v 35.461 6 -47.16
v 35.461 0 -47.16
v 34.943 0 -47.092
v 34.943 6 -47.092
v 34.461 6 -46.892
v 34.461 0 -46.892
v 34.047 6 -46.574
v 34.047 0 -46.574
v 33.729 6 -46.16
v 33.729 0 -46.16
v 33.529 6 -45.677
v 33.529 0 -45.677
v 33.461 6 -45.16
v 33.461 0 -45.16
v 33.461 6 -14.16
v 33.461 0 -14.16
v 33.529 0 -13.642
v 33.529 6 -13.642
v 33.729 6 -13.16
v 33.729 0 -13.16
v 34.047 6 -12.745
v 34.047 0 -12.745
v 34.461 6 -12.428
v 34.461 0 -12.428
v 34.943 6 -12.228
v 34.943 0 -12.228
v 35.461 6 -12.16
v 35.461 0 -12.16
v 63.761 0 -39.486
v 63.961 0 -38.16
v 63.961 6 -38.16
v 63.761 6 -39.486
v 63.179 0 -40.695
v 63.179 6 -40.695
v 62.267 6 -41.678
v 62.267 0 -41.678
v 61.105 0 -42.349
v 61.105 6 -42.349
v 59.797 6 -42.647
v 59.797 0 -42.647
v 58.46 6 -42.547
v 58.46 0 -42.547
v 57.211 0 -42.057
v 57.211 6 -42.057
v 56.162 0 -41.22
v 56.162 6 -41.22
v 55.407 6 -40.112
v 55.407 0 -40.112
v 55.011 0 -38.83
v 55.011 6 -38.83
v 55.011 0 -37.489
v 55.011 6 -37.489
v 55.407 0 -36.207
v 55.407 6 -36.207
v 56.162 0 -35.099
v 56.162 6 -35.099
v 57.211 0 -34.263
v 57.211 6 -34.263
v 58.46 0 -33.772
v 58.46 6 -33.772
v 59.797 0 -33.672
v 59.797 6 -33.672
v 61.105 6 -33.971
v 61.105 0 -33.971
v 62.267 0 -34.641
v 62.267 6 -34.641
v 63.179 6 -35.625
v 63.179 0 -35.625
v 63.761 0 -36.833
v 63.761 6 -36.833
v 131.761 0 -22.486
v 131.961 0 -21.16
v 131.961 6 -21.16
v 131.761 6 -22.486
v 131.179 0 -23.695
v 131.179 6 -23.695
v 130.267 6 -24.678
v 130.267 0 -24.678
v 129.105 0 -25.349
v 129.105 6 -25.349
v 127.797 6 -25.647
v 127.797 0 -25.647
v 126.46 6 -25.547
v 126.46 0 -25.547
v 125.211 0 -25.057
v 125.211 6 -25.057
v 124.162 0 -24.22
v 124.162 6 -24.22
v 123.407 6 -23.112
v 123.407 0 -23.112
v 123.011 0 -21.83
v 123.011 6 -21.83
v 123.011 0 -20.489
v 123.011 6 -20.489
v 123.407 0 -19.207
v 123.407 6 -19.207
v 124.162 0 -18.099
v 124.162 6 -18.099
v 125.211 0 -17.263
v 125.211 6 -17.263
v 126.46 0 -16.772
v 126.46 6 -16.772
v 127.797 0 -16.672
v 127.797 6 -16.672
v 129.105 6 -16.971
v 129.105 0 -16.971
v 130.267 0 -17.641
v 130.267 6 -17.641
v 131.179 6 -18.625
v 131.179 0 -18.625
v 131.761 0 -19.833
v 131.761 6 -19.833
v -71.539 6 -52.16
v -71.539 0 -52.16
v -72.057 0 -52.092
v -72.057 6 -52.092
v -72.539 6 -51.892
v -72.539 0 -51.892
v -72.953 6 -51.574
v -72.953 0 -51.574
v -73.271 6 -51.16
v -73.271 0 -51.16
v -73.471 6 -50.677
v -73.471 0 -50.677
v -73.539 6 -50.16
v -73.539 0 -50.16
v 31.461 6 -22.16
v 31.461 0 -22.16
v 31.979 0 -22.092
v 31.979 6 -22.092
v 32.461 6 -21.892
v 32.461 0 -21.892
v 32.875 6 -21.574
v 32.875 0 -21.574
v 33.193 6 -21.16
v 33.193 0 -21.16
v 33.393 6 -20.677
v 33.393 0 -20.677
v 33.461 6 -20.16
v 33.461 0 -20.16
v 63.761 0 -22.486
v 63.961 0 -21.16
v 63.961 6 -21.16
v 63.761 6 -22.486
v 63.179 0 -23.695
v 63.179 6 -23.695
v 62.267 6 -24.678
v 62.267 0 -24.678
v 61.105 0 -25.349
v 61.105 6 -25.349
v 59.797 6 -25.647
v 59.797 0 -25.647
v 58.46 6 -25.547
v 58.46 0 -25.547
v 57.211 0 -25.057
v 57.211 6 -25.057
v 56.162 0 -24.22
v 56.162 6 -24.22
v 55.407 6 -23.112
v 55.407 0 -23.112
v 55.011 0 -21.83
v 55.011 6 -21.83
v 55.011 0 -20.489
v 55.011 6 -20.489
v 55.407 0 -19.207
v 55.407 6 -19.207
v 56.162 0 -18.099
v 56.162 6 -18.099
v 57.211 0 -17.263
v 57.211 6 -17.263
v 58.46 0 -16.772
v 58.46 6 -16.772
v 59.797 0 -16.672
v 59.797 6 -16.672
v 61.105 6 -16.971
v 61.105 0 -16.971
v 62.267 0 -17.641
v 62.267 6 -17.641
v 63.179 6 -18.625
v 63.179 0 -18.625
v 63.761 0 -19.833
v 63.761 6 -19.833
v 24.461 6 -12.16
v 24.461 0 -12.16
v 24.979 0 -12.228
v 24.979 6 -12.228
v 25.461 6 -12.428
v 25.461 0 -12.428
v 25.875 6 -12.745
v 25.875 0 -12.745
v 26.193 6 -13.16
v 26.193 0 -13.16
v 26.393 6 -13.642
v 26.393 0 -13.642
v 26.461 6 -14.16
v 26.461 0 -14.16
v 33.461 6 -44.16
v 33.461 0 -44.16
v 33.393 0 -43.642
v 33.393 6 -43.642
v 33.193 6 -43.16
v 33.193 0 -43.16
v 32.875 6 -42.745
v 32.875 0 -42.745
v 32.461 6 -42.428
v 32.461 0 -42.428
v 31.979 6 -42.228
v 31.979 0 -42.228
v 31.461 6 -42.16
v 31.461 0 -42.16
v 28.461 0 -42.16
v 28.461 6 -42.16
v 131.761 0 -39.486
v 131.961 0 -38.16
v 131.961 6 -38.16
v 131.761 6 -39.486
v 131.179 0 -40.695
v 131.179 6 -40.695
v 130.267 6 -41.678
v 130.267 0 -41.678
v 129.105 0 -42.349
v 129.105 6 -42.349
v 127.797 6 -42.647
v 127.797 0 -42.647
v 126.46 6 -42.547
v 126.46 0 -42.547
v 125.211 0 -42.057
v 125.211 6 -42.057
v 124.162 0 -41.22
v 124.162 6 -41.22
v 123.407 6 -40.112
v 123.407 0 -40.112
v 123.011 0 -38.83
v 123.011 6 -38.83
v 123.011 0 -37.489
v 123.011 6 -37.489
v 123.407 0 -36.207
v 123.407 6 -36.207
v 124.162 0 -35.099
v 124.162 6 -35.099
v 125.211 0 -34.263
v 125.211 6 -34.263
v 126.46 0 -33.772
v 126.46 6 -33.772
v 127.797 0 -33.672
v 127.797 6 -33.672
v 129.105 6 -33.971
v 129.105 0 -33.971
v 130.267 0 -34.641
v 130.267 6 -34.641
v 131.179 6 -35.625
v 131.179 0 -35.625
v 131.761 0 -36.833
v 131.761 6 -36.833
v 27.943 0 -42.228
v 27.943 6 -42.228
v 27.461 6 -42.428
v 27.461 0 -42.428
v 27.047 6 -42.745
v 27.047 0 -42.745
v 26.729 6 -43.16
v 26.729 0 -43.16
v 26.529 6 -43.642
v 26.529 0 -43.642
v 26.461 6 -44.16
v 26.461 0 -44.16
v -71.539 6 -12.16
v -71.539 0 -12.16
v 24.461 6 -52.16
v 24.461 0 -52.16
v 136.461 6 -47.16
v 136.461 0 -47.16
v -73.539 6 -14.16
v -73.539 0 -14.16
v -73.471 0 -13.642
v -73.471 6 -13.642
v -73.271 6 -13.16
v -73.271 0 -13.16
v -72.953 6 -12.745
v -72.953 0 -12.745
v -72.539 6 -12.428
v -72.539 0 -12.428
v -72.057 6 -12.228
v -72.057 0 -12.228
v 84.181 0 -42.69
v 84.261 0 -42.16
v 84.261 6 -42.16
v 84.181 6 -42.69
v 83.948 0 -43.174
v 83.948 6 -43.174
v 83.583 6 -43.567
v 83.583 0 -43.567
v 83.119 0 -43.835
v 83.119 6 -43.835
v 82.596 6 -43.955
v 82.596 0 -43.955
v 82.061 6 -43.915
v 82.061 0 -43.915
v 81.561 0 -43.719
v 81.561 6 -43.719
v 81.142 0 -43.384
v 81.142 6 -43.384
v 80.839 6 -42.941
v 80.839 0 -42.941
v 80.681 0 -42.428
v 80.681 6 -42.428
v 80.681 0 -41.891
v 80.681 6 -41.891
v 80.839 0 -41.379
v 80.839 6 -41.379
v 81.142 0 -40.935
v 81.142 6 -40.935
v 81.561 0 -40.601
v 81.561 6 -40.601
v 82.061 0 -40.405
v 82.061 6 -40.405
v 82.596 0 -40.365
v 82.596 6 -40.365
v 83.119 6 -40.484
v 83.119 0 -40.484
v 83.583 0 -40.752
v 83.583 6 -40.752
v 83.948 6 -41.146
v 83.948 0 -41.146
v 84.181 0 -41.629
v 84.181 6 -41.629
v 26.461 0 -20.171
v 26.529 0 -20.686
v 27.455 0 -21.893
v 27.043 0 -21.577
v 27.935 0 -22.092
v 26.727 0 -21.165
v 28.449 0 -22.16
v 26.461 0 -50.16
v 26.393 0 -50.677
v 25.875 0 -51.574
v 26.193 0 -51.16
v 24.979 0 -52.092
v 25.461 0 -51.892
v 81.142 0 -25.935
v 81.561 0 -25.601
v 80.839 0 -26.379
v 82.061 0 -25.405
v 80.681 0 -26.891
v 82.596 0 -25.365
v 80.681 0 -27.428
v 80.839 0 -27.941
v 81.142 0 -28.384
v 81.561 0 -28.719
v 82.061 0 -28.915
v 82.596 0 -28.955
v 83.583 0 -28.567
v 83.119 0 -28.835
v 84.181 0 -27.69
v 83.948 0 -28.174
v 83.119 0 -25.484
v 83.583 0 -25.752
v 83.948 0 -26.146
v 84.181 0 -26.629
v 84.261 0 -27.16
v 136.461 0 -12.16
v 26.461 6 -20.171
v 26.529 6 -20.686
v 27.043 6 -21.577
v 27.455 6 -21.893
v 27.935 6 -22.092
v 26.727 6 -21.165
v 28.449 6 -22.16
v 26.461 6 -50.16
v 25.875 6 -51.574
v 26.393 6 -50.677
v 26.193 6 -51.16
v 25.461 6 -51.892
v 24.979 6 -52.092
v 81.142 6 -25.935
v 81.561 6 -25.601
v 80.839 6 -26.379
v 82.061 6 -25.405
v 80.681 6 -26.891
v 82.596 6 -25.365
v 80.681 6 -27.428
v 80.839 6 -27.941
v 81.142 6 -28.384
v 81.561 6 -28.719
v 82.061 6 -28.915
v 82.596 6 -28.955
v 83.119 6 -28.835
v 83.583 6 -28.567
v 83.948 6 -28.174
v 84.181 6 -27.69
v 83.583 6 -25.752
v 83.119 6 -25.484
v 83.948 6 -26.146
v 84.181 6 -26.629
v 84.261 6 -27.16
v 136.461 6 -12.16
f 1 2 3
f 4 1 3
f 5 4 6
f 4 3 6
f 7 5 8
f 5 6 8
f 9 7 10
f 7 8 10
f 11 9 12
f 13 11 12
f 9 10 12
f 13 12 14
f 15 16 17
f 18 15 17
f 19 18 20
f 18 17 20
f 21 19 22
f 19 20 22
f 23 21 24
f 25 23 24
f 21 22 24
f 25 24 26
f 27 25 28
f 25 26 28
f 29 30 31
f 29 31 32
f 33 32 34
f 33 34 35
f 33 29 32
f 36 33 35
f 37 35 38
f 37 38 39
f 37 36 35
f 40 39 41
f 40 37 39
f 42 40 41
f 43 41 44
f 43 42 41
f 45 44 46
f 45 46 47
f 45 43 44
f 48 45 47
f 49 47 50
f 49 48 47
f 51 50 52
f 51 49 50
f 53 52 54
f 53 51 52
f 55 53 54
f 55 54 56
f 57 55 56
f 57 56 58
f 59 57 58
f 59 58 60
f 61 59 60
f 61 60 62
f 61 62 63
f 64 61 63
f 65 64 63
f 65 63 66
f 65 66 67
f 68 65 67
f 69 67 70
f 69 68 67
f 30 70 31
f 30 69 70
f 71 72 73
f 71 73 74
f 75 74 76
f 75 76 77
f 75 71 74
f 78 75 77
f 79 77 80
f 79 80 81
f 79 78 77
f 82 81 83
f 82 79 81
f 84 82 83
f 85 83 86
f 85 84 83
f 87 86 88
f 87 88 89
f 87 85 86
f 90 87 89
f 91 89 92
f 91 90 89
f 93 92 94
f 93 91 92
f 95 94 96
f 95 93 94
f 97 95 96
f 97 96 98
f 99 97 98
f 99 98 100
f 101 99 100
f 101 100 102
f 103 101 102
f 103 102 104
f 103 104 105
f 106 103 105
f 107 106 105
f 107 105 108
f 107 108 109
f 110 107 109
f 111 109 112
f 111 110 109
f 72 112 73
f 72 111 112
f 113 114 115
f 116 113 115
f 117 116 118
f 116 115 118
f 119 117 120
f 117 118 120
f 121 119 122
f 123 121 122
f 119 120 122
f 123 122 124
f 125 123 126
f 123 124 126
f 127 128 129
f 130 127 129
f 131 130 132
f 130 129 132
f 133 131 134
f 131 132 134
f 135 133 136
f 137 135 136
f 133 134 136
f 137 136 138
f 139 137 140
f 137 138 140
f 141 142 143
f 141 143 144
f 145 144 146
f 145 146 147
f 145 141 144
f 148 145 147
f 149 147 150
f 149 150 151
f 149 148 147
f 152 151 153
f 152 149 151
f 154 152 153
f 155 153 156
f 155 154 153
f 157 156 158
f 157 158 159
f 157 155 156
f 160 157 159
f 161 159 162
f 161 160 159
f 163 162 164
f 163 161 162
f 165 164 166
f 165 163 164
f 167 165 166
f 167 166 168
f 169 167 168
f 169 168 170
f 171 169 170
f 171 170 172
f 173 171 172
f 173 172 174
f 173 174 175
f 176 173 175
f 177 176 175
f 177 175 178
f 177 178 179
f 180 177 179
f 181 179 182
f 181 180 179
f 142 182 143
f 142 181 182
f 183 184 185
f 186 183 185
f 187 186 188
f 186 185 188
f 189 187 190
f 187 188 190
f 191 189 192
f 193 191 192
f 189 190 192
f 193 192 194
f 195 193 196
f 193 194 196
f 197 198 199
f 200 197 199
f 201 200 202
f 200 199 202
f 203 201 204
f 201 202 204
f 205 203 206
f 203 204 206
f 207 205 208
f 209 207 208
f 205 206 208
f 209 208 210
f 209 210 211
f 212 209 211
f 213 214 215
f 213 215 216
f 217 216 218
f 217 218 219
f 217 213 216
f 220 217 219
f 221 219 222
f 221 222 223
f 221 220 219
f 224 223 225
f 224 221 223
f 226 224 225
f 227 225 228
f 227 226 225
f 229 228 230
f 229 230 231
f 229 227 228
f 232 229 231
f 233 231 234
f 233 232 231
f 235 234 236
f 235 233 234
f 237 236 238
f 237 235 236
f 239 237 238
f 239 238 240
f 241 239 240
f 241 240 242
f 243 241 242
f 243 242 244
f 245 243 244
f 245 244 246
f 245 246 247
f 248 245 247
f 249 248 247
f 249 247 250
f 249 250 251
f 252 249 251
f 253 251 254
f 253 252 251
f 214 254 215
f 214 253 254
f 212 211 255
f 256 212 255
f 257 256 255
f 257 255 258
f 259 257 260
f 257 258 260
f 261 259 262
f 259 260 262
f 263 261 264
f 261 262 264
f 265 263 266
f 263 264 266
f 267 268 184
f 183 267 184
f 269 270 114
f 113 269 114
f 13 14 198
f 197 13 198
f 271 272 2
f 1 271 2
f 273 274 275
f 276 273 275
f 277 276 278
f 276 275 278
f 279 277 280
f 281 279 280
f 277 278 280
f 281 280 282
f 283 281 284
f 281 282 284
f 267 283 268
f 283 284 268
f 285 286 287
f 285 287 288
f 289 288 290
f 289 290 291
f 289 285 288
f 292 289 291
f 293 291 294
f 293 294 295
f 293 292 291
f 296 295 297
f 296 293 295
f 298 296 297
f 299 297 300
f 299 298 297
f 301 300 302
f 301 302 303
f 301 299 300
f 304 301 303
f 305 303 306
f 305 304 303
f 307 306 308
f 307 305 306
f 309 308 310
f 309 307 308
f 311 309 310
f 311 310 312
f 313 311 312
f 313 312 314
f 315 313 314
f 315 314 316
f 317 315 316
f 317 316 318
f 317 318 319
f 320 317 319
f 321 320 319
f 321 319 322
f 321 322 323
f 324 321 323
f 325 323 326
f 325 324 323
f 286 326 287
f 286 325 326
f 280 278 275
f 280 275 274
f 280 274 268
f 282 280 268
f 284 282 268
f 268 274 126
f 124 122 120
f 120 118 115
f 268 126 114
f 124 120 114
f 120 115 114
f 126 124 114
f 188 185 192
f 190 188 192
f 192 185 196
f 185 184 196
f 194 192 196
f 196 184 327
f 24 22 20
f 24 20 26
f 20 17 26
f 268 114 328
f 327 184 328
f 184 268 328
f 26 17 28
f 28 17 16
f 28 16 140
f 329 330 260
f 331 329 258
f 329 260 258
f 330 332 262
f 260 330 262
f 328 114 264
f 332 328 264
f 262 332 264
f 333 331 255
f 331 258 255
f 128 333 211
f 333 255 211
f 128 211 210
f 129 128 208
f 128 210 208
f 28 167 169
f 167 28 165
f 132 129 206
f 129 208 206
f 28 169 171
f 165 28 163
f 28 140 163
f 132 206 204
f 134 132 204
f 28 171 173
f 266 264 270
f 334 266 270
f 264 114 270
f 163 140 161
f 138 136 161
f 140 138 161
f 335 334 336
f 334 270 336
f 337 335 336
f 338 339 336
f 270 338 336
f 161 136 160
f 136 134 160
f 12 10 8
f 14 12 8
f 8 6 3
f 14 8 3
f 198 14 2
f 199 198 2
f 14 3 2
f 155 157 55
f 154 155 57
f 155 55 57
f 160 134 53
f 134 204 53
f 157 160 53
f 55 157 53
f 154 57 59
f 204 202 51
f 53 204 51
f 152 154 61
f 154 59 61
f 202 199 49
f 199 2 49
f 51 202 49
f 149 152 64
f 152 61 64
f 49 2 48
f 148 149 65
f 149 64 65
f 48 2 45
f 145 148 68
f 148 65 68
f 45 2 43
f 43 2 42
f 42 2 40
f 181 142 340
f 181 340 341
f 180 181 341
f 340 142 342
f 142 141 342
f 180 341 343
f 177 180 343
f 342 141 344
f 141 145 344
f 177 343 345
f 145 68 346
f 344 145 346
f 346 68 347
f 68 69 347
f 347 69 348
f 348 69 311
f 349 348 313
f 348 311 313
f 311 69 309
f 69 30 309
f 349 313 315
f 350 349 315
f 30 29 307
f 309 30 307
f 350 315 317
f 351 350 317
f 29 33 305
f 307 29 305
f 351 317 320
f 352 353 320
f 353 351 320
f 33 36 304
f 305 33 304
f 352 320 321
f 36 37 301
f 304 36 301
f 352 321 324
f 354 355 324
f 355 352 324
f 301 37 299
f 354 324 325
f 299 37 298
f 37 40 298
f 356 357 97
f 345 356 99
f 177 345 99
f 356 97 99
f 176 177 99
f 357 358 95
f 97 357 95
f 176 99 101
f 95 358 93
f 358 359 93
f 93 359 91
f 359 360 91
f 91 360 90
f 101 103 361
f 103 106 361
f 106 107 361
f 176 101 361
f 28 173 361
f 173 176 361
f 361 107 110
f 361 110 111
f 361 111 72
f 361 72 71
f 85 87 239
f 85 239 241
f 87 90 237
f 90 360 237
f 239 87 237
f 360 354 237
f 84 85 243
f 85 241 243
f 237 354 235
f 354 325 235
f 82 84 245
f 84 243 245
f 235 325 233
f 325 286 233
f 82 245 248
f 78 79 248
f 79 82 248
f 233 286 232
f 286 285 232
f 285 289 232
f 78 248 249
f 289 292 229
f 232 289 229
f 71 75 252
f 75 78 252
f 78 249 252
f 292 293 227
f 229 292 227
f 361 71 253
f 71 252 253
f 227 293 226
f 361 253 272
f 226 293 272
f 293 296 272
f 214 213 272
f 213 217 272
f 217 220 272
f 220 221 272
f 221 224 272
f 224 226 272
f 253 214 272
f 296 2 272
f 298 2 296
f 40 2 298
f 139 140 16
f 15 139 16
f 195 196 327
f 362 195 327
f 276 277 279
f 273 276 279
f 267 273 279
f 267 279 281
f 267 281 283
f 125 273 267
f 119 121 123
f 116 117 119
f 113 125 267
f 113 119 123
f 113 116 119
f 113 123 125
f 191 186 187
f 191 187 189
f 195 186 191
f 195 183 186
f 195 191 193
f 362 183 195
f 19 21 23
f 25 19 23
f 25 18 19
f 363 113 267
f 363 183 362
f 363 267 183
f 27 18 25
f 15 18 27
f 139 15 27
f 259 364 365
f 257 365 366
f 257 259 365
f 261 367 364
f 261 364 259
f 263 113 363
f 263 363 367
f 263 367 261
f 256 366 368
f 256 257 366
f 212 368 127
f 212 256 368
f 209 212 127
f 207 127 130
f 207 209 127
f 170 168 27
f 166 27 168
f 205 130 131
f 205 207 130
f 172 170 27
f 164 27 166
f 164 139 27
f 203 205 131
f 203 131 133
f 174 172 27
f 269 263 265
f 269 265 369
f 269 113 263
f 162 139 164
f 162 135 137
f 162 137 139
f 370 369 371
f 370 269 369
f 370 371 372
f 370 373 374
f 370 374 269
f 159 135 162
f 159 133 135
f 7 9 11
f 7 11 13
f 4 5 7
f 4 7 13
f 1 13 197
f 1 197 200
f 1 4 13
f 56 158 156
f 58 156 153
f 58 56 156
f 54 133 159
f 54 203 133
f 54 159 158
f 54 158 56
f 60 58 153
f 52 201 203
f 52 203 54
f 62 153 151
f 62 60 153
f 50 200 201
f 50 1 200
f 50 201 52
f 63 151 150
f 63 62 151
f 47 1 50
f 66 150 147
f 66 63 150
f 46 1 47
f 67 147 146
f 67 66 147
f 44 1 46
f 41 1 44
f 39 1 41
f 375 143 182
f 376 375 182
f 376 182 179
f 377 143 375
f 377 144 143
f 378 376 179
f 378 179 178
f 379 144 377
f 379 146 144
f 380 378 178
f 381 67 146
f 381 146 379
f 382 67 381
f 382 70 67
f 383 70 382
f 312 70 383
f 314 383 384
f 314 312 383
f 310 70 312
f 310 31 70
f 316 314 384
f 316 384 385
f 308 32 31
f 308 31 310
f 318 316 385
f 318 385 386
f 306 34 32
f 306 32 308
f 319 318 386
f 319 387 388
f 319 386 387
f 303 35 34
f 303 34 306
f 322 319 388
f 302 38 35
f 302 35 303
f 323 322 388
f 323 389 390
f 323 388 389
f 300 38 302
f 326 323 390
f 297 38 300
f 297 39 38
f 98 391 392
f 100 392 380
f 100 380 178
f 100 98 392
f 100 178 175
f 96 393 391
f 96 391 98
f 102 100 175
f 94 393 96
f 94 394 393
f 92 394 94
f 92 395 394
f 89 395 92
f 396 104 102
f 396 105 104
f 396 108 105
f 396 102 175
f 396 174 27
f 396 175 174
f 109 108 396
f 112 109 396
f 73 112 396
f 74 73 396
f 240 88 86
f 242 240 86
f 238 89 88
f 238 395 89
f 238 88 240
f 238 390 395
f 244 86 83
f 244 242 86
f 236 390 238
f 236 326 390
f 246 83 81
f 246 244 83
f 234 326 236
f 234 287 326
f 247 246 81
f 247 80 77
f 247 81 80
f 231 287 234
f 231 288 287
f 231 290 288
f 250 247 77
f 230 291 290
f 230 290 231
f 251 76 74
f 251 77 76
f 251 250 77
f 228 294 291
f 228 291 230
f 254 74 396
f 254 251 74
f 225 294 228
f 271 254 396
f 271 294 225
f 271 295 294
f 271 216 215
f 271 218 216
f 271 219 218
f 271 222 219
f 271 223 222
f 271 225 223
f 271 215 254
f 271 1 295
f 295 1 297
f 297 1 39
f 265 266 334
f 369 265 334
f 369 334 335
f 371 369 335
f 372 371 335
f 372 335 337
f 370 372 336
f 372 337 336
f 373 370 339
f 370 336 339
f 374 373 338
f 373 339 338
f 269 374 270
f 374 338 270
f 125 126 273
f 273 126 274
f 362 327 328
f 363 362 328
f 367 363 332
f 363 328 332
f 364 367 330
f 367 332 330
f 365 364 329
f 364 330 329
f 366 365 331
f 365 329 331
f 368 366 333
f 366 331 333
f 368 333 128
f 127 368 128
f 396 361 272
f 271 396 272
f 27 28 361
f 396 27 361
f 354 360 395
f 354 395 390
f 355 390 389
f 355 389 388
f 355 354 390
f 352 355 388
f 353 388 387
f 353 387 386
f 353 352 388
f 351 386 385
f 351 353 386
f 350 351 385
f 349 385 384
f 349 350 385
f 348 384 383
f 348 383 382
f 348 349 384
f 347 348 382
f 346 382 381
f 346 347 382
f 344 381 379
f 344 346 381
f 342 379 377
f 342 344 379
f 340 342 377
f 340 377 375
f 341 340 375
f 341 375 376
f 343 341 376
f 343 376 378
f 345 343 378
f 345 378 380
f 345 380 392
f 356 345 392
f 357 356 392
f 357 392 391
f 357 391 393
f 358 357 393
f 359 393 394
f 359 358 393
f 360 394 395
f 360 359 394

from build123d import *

# Parameters (mm, degrees)
SKETCH_4_R      = 4.5
SKETCH_4_R_2    = 1.8
EXTRUDE_1_DEPTH = 6


with BuildPart() as part:
    # 草图4 → 凸台-拉伸1 (new body)
    with BuildSketch(Plane(origin=(0, 0, 0), x_dir=(1, 0, 0), z_dir=(0, 1, 0))):
        with BuildLine():
            Line((136.46105702, 22.159664941), (136.46105702, 47.159664941))
            Line((136.46105702, 47.159664941), (35.46105702, 47.159664941))
            ThreePointArc((35.46105702, 47.159664941), (34.046843458, 46.573878503), (33.46105702, 45.159664941))
            Line((33.46105702, 45.159664941), (33.46105702, 44.159664941))
            ThreePointArc((33.46105702, 44.159664941), (32.875270583, 42.745451378), (31.46105702, 42.159664941))
            Line((31.46105702, 42.159664941), (28.46105702, 42.159664941))
            ThreePointArc((28.46105702, 42.159664941), (27.046843458, 42.745451378), (26.46105702, 44.159664941))
            Line((26.46105702, 44.159664941), (26.46105702, 49.744433688))
            Line((26.46105702, 49.744433688), (26.46105702, 50.159664941))
            ThreePointArc((26.46105702, 50.159664941), (25.875270583, 51.573878503), (24.46105702, 52.159664941))
            Line((24.46105702, 52.159664941), (-71.53894298, 52.159664941))
            ThreePointArc((-71.53894298, 52.159664941), (-72.953156542, 51.573878503), (-73.53894298, 50.159664941))
            Line((-73.53894298, 50.159664941), (-73.53894298, 14.159664941))
            ThreePointArc((-73.53894298, 14.159664941), (-72.953156542, 12.745451378), (-71.53894298, 12.159664941))
            Line((-71.53894298, 12.159664941), (24.46105702, 12.159664941))
            ThreePointArc((24.46105702, 12.159664941), (25.875270583, 12.745451378), (26.46105702, 14.159664941))
            Line((26.46105702, 14.159664941), (26.46105702, 20.171292313))
            ThreePointArc((26.46105702, 20.171292313), (27.04343788, 21.577284081), (28.449429648, 22.159664941))
            Line((28.449429648, 22.159664941), (31.46105702, 22.159664941))
            ThreePointArc((31.46105702, 22.159664941), (32.875270583, 21.573878503), (33.46105702, 20.159664941))
            Line((33.46105702, 20.159664941), (33.46105702, 14.159664941))
            ThreePointArc((33.46105702, 14.159664941), (34.046843458, 12.745451378), (35.46105702, 12.159664941))
            Line((35.46105702, 12.159664941), (136.46105702, 12.159664941))
            Line((136.46105702, 12.159664941), (136.46105702, 22.159664941))
        make_face()
        with Locations((59.46105702, 21.159664941)):
            Circle(SKETCH_4_R, mode=Mode.SUBTRACT)
        with Locations((127.46105702, 21.159664941)):
            Circle(SKETCH_4_R, mode=Mode.SUBTRACT)
        with Locations((82.46105702, 27.159664941)):
            Circle(SKETCH_4_R_2, mode=Mode.SUBTRACT)
        with Locations((59.46105702, 38.159664941)):
            Circle(SKETCH_4_R, mode=Mode.SUBTRACT)
        with Locations((127.46105702, 38.159664941)):
            Circle(SKETCH_4_R, mode=Mode.SUBTRACT)
        with Locations((82.46105702, 42.159664941)):
            Circle(SKETCH_4_R_2, mode=Mode.SUBTRACT)
    extrude(amount=EXTRUDE_1_DEPTH)


solid = part.part
